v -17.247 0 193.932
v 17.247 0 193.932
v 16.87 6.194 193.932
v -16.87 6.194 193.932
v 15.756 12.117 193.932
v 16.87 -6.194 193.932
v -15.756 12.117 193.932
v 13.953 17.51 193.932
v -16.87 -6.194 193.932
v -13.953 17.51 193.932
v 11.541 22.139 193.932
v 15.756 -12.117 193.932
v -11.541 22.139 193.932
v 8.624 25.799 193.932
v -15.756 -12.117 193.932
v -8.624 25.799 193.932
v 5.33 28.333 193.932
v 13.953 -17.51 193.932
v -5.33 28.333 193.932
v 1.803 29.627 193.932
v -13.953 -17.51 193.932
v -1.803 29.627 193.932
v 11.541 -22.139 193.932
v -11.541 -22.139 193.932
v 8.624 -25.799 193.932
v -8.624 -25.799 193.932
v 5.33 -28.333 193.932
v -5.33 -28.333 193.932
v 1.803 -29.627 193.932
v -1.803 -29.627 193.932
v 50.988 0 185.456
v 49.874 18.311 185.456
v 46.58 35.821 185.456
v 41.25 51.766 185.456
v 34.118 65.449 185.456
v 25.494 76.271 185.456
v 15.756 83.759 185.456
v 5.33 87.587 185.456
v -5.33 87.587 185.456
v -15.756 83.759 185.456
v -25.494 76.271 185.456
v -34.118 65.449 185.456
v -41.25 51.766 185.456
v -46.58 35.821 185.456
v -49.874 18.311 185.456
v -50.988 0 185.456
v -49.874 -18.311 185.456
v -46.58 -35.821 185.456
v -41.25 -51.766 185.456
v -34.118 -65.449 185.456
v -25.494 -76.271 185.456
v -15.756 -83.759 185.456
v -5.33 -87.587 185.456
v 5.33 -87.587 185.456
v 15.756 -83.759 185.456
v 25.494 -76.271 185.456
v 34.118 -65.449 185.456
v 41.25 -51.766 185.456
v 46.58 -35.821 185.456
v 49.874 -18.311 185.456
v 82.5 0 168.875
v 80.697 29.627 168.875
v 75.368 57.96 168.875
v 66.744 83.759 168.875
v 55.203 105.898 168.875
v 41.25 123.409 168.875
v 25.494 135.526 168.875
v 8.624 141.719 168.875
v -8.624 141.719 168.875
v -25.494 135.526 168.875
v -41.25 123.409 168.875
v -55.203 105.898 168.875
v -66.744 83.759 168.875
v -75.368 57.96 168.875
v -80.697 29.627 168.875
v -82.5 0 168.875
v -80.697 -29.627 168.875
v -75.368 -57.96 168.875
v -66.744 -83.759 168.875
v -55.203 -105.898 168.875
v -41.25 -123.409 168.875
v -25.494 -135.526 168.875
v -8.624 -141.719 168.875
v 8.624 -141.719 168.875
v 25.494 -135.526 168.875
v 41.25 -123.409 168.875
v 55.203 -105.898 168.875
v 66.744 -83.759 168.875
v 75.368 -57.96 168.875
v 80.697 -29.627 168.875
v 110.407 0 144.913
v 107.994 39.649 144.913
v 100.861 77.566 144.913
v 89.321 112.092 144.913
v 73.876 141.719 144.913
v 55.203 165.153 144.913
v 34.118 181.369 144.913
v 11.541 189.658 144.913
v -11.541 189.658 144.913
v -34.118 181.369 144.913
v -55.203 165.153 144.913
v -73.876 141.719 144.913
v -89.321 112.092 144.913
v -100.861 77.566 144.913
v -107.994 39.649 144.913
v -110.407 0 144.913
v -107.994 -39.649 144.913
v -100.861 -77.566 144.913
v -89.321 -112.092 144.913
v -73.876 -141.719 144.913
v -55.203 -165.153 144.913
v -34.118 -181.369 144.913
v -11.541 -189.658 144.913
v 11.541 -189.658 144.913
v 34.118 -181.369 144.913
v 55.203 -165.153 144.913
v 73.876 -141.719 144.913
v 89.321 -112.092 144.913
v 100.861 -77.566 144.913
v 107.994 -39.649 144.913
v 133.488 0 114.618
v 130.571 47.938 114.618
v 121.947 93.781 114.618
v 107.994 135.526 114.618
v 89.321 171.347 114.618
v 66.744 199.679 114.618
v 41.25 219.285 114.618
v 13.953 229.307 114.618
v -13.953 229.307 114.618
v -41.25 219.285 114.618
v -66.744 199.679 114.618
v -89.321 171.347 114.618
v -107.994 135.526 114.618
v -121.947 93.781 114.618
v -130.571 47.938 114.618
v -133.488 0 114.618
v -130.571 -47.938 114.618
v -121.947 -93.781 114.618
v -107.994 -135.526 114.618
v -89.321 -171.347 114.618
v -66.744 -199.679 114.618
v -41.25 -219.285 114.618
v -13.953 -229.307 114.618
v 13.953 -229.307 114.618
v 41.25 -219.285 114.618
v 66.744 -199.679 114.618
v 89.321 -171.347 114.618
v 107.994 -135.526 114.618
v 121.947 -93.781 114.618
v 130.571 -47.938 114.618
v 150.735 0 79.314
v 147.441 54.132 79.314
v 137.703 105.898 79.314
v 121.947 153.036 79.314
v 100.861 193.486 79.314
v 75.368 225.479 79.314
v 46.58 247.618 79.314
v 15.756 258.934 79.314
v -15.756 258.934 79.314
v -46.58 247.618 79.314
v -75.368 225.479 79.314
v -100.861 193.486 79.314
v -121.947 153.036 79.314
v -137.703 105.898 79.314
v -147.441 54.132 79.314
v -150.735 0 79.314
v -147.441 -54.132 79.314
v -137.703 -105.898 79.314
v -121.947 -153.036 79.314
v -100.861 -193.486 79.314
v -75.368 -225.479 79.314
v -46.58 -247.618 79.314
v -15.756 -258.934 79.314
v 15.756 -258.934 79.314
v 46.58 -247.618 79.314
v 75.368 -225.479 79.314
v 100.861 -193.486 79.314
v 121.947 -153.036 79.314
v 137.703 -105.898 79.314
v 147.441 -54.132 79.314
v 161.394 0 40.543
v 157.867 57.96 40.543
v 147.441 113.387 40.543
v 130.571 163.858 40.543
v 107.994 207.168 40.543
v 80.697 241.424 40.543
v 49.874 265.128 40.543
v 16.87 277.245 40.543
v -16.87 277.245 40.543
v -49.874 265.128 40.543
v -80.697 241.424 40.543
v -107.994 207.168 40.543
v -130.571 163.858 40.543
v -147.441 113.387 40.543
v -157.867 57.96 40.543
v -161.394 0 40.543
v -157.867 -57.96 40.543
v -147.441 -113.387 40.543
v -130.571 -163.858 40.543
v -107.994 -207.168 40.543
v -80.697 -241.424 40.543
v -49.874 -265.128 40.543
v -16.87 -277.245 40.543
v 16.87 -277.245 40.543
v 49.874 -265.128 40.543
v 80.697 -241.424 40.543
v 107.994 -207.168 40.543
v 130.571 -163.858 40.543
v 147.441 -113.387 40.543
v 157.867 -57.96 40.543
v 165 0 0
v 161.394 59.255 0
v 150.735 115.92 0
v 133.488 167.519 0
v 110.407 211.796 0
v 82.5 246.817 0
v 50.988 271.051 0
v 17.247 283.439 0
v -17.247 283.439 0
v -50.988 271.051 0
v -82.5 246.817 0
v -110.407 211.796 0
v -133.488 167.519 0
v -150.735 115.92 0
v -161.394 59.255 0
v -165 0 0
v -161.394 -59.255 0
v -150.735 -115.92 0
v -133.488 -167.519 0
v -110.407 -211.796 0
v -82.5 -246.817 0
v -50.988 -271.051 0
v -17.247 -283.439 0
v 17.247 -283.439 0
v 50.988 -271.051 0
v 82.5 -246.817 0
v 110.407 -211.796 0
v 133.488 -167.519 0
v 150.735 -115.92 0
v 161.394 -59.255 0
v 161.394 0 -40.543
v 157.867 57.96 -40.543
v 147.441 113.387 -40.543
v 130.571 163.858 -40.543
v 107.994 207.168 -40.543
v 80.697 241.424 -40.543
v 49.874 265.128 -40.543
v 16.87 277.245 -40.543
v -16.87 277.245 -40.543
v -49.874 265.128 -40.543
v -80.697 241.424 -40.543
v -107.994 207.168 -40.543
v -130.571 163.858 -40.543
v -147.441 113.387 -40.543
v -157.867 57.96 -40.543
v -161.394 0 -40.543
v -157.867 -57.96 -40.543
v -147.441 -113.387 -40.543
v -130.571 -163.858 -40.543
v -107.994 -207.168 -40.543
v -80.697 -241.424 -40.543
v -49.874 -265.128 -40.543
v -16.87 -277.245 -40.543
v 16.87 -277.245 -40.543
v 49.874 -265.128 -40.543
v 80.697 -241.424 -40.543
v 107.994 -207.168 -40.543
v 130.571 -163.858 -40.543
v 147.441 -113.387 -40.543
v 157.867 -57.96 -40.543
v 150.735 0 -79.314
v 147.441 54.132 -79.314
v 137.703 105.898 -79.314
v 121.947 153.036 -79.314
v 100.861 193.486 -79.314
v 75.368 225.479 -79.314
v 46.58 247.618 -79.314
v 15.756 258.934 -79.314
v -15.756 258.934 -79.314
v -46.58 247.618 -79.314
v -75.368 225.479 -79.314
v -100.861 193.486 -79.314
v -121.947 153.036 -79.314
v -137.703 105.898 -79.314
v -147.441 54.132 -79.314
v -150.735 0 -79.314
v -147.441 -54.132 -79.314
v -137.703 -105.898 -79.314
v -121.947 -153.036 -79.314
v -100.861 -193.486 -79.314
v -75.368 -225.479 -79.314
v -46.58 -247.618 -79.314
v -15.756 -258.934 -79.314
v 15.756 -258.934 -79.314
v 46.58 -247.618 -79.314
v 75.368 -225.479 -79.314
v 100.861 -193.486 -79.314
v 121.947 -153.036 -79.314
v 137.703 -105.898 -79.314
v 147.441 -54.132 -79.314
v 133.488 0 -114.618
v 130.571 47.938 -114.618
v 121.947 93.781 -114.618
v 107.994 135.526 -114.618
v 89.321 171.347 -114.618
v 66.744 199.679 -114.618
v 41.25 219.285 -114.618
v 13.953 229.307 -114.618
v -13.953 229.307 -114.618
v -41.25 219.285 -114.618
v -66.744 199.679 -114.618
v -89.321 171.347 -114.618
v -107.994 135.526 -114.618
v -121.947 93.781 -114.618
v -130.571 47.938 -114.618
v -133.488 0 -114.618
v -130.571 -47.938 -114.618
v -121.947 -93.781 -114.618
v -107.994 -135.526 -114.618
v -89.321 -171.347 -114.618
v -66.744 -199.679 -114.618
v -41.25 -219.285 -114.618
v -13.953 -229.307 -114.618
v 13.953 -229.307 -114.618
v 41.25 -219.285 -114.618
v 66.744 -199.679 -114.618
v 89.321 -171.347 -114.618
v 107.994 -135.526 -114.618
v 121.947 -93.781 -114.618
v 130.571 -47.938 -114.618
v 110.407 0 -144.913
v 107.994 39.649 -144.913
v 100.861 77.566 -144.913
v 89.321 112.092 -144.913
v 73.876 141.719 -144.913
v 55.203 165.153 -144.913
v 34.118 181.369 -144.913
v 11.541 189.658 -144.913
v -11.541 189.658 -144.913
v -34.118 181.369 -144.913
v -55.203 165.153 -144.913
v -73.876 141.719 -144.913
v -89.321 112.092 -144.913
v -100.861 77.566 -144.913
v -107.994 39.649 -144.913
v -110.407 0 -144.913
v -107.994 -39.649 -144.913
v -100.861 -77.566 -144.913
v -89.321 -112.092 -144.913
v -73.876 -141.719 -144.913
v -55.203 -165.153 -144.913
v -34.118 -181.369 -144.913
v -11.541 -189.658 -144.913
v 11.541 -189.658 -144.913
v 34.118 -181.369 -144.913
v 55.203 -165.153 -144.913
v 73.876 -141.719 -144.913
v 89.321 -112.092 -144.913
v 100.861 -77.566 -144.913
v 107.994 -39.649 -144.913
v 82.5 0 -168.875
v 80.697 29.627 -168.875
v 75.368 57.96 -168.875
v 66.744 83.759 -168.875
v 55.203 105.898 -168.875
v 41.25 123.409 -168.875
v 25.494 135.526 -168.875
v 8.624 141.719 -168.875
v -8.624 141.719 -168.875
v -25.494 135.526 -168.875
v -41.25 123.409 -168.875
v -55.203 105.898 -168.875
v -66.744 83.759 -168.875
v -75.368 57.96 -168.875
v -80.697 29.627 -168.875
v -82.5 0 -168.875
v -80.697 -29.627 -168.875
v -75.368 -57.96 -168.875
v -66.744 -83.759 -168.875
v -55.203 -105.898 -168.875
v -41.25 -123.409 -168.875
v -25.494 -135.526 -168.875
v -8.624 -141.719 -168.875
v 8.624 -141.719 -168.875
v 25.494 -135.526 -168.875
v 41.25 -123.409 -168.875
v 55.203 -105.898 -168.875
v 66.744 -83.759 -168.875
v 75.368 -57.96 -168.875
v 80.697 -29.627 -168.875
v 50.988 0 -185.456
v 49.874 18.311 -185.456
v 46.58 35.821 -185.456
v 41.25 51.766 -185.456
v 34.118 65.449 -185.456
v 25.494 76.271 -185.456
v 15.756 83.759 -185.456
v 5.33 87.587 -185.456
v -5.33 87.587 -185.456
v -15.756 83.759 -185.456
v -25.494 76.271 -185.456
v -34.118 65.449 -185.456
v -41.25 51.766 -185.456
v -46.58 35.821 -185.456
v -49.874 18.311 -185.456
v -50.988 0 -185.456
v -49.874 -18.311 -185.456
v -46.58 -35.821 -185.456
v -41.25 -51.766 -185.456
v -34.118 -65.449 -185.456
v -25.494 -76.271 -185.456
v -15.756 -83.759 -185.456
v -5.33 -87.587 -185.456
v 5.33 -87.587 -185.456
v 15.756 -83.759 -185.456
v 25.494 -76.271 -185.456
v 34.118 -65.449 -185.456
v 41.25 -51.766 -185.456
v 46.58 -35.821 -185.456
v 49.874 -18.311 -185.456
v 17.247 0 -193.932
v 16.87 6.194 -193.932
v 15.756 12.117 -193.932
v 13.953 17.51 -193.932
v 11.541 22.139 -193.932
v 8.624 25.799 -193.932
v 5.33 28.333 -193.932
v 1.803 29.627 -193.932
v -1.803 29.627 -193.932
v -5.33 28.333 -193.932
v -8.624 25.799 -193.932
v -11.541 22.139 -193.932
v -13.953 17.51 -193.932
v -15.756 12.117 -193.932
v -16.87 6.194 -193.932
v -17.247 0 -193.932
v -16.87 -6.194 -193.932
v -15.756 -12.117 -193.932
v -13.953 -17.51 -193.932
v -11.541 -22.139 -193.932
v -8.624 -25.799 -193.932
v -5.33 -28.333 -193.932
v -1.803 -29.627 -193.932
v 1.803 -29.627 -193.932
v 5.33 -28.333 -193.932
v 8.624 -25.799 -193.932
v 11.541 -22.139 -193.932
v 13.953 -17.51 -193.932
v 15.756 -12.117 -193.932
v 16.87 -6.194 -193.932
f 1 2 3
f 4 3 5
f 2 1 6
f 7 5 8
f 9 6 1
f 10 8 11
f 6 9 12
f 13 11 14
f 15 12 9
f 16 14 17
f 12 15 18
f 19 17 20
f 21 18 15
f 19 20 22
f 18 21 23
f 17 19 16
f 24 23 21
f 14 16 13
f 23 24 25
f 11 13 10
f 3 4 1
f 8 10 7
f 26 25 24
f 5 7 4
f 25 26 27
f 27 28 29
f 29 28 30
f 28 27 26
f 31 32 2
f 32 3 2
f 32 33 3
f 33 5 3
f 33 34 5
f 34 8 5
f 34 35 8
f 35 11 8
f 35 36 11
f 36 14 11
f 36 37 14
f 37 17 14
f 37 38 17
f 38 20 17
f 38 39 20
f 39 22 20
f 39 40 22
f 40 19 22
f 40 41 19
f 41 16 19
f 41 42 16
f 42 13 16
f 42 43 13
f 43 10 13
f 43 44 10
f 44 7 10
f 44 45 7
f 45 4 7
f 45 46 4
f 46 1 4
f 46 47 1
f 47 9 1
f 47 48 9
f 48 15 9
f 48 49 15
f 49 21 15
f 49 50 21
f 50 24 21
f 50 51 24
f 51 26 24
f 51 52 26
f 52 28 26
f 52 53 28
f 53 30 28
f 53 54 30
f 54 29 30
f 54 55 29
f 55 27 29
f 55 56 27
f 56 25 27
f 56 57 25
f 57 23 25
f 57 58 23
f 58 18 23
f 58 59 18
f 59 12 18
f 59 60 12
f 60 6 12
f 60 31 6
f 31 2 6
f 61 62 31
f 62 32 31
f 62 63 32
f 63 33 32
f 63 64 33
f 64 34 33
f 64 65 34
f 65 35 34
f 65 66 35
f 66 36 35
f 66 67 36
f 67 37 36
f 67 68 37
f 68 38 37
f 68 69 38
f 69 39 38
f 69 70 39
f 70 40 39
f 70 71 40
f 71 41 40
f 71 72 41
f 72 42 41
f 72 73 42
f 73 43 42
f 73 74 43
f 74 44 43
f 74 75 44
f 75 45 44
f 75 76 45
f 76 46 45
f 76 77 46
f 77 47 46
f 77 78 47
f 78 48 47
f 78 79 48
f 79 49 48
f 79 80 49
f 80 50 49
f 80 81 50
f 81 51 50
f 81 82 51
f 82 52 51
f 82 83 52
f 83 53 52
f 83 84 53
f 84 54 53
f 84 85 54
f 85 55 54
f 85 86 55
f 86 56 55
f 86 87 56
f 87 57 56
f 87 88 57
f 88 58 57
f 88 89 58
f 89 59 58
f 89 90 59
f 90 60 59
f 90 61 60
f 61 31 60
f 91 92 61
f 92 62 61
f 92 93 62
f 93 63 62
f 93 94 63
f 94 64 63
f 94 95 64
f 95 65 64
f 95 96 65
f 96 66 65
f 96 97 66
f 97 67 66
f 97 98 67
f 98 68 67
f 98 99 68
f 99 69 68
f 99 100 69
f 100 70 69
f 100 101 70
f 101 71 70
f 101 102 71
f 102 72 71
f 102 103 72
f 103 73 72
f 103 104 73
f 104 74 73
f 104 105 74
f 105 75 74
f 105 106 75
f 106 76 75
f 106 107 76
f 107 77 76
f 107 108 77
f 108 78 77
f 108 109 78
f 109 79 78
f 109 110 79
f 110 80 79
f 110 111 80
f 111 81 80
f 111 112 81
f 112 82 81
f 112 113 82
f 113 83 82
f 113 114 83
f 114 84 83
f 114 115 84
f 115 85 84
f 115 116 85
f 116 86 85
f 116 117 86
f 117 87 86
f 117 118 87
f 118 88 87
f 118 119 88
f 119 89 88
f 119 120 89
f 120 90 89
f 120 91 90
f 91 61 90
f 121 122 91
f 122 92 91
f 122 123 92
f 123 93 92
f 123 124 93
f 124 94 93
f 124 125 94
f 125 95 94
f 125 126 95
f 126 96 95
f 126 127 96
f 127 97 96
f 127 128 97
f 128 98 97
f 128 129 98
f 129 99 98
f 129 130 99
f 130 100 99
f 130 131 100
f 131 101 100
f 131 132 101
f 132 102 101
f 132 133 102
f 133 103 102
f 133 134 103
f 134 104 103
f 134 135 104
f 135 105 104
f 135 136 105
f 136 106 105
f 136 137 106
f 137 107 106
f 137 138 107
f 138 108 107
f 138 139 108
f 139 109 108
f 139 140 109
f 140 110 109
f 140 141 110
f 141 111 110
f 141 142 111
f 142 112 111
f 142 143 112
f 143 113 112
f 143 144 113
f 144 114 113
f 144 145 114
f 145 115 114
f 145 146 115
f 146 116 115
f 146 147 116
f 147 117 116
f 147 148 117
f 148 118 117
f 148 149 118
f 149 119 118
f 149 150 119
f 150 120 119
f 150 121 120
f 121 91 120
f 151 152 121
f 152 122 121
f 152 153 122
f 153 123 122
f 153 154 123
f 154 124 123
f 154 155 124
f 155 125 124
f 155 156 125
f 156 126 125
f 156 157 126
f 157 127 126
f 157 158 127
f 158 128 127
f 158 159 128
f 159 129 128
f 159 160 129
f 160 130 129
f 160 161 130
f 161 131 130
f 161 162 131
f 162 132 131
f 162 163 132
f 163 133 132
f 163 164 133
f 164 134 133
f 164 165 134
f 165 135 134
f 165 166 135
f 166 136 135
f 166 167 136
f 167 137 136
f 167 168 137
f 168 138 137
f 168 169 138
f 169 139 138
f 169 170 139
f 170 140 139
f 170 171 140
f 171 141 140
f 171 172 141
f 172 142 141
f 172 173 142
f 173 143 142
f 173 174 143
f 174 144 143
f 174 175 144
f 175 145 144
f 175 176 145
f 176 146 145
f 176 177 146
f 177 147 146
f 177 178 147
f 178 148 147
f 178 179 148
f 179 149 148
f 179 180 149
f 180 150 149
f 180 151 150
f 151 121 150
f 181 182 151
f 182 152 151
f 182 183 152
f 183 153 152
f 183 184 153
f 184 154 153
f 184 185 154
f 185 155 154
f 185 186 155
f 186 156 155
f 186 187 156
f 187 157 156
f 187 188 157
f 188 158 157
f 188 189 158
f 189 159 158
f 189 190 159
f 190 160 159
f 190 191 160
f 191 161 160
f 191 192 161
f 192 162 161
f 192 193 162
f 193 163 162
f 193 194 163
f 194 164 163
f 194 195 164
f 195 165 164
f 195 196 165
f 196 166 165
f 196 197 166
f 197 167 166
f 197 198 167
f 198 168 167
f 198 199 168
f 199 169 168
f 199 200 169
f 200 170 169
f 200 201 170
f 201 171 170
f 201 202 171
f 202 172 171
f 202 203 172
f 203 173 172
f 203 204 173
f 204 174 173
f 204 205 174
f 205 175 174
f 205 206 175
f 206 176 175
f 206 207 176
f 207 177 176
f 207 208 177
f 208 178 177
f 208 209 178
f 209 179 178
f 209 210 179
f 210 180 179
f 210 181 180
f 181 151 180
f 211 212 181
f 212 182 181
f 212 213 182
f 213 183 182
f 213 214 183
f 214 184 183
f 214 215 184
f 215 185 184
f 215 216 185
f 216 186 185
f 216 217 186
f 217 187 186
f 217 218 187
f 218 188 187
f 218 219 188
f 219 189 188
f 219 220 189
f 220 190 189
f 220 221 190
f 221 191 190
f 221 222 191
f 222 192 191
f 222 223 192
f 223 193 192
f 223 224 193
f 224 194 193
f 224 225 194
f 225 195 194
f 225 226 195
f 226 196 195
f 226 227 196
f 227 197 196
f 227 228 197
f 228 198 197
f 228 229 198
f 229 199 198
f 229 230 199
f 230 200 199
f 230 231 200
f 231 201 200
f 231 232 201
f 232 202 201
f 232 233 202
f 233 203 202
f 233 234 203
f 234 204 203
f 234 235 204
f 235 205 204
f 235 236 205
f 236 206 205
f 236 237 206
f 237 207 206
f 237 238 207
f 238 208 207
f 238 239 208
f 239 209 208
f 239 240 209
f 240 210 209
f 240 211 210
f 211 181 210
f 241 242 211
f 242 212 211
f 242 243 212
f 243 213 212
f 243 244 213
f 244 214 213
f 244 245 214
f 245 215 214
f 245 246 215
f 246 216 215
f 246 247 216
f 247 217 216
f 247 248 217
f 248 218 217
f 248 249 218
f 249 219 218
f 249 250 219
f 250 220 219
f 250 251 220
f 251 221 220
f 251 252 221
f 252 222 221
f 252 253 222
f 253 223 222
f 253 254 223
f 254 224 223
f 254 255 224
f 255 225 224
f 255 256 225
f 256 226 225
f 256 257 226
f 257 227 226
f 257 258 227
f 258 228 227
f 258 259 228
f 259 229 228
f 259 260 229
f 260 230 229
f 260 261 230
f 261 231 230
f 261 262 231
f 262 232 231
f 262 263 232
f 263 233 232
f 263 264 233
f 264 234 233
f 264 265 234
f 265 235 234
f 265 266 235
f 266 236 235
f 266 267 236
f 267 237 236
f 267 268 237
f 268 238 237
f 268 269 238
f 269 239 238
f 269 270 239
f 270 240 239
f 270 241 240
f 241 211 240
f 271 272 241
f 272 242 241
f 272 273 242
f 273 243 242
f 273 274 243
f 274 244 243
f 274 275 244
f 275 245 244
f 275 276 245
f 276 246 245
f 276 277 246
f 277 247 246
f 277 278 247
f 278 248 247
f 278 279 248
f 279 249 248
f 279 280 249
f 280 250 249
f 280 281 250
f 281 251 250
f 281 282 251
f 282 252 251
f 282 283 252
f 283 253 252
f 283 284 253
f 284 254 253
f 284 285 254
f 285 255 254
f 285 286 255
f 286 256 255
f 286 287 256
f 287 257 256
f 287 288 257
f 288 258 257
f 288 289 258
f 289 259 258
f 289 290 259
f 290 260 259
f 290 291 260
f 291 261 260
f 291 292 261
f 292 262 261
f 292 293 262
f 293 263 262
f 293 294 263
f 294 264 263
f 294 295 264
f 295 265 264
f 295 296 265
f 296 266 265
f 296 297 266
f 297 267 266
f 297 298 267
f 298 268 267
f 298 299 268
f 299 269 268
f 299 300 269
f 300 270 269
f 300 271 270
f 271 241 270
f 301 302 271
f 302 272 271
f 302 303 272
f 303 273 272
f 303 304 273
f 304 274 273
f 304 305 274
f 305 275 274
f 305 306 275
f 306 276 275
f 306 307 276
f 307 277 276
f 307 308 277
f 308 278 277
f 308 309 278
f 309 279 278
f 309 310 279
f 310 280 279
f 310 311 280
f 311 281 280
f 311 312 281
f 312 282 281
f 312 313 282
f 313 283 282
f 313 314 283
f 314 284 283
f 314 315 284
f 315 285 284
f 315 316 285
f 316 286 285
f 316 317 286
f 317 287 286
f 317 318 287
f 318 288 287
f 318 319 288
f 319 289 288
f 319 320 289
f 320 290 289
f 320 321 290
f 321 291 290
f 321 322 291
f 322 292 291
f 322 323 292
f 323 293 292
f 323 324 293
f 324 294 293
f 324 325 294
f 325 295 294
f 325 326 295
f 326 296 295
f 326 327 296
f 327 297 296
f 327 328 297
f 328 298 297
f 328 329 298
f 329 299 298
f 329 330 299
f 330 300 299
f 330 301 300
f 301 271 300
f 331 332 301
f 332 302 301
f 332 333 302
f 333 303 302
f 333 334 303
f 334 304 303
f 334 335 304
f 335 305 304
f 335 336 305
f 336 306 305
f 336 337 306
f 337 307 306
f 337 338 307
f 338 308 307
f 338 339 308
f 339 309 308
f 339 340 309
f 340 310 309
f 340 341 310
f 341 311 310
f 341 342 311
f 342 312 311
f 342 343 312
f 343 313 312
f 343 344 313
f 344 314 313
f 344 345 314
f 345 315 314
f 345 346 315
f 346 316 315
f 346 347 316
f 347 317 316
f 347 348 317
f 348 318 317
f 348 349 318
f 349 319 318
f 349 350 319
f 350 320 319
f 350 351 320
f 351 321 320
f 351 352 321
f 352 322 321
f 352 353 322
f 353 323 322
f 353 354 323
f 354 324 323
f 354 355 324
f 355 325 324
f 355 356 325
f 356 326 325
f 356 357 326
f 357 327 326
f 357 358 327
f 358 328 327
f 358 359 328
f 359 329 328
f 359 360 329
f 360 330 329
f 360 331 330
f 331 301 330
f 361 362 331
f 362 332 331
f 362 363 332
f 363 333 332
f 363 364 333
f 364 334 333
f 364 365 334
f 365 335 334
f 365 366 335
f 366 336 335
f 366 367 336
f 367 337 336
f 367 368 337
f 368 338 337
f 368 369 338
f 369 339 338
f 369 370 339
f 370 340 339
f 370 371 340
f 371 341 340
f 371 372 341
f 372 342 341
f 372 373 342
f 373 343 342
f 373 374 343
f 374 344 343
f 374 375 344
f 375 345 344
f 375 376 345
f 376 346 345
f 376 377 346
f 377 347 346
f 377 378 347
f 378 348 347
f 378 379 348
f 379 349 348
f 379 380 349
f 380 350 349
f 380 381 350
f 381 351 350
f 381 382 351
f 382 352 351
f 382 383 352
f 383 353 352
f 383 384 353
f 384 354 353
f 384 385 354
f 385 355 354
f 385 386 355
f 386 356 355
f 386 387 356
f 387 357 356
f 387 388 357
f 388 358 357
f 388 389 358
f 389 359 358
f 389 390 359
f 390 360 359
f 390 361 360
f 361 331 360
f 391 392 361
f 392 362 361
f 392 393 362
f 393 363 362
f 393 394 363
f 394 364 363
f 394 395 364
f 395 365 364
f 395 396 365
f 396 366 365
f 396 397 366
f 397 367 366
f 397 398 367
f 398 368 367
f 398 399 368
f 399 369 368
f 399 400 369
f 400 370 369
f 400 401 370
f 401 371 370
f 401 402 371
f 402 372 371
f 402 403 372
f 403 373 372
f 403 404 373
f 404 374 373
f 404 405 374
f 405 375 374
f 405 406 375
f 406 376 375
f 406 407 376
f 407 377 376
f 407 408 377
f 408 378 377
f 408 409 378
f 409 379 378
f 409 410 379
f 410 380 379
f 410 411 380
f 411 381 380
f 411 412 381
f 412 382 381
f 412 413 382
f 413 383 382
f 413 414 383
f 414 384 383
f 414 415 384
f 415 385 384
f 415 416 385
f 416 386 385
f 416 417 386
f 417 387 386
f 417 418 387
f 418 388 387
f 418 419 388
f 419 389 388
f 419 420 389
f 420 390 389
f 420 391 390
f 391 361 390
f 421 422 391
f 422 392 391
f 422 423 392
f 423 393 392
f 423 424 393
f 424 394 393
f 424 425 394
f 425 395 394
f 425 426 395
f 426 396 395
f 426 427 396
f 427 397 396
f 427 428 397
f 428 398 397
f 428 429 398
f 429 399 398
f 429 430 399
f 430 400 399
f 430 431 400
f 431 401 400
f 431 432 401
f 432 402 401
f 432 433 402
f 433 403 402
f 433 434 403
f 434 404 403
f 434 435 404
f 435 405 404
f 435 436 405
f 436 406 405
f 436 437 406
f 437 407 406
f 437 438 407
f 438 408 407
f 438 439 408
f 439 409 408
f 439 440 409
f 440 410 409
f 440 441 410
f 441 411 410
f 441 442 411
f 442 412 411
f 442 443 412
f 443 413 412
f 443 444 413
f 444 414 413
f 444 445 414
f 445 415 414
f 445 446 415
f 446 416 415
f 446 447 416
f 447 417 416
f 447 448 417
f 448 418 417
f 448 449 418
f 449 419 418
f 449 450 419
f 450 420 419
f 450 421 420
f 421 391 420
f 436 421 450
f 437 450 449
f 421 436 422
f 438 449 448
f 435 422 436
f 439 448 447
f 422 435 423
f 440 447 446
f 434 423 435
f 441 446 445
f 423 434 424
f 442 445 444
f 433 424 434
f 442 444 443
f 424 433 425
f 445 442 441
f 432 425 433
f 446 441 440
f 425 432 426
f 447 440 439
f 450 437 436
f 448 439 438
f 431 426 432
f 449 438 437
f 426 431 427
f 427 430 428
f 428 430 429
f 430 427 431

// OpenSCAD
// Generated by SolidPython 1.0.1 on 2020-07-29 00:46:50


scale(v = [11, 19, 13]) {
	sphere(r = 15);
}
/***********************************************
*********      SolidPython code:      **********
************************************************
 
# import packages: SolidPython
from solid import *
from solid.utils import *
from itertools import chain, combinations, permutations


class Resize:

    def __init__(self, scad_file):
        self.scad_file = scad_file
        #self.scad_file = import_scad(scad_file)
        # cone/cylinder param:
        self.r1 = 0
        self.r2 = 0
        self.h = 0
        # rectangular prism param:
        self.w = 0
        self.l = 0
        # ellipse param:
        self.r = 0

    # import OpenScad code (file name corresponds to shape)


    # classify shape + parameters
    def assign(self, param1, param2, param3):
        if self.scad_file == 'cone.scad':
            self.r1 = param1
            self.r2 = param2
            self.h = param3
        elif self.scad_file == 'cylinder.scad':
            self.r1 = param1
            self.r2 = param2
            self.h = param3
        elif self.scad_file == 'rectangularPrism.scad':
            self.h = param1
            self.l = param2
            self.w = param3
        else:
            self.r = param1
            self.h = param2

    # resize parameters
    def iterate(self):
        x = range(3, 20, 2)
        i = 1
        if self.scad_file == 'cone.scad':
            tempList = list(permutations(x, 2))
            for temp in tempList:
                param1 = temp[0]
                param2 = temp[1]
                filepath = 'produced_scad_files/' + 'cone' + str(param1) + '_' + str(param2) + '_' + '.scad'
                scad_render_to_file(cylinder(h=param1, r1=param2, r2=0), filepath)

        elif self.scad_file == 'cylinder.scad':
            tempList = list(permutations(x, 3))
            for temp in tempList:
                param1 = temp[0]
                param2 = temp[1]
                filepath = 'produced_scad_files/' + 'cylinder' + str(param1) + '_' + str(param2) + '_' + '.scad'
                scad_render_to_file(cylinder(h=param1, r1=param2, r2=param2), filepath)

        elif self.scad_file == 'rectangularPrism.scad':
            tempList = list(permutations(x, 3))
            for temp in tempList:
                param1 = temp[0]
                param2 = temp[1]
                param3 = temp[2]
                filepath = 'produced_scad_files/' + 'rectangularPrism' + str(param1) + '_' + str(param2) + '_' + str(
                    param3) + '.scad'
                scad_render_to_file(cube(size=(param1, param2, param3)), filepath)

        elif self.scad_file == 'ellipse.scad':
            tempList = list(permutations(x, 4))
            for temp in tempList:
                param1 = temp[0]
                param2 = temp[1]
                param3 = temp[2]
                param4 = temp[3]
                filepath = 'produced_scad_files/' + 'ellipse' + str(param1) + '_' + str(param2) + '_' + str(param3) + '_' + str(param4) + '.scad'
                scad_render_to_file(scale([param1, param2, param3])(sphere(r=param4)), filepath)

    def render_to_scadfile(self):
        scad_render_to_file(scad, 'example.scad') 
 
************************************************/
